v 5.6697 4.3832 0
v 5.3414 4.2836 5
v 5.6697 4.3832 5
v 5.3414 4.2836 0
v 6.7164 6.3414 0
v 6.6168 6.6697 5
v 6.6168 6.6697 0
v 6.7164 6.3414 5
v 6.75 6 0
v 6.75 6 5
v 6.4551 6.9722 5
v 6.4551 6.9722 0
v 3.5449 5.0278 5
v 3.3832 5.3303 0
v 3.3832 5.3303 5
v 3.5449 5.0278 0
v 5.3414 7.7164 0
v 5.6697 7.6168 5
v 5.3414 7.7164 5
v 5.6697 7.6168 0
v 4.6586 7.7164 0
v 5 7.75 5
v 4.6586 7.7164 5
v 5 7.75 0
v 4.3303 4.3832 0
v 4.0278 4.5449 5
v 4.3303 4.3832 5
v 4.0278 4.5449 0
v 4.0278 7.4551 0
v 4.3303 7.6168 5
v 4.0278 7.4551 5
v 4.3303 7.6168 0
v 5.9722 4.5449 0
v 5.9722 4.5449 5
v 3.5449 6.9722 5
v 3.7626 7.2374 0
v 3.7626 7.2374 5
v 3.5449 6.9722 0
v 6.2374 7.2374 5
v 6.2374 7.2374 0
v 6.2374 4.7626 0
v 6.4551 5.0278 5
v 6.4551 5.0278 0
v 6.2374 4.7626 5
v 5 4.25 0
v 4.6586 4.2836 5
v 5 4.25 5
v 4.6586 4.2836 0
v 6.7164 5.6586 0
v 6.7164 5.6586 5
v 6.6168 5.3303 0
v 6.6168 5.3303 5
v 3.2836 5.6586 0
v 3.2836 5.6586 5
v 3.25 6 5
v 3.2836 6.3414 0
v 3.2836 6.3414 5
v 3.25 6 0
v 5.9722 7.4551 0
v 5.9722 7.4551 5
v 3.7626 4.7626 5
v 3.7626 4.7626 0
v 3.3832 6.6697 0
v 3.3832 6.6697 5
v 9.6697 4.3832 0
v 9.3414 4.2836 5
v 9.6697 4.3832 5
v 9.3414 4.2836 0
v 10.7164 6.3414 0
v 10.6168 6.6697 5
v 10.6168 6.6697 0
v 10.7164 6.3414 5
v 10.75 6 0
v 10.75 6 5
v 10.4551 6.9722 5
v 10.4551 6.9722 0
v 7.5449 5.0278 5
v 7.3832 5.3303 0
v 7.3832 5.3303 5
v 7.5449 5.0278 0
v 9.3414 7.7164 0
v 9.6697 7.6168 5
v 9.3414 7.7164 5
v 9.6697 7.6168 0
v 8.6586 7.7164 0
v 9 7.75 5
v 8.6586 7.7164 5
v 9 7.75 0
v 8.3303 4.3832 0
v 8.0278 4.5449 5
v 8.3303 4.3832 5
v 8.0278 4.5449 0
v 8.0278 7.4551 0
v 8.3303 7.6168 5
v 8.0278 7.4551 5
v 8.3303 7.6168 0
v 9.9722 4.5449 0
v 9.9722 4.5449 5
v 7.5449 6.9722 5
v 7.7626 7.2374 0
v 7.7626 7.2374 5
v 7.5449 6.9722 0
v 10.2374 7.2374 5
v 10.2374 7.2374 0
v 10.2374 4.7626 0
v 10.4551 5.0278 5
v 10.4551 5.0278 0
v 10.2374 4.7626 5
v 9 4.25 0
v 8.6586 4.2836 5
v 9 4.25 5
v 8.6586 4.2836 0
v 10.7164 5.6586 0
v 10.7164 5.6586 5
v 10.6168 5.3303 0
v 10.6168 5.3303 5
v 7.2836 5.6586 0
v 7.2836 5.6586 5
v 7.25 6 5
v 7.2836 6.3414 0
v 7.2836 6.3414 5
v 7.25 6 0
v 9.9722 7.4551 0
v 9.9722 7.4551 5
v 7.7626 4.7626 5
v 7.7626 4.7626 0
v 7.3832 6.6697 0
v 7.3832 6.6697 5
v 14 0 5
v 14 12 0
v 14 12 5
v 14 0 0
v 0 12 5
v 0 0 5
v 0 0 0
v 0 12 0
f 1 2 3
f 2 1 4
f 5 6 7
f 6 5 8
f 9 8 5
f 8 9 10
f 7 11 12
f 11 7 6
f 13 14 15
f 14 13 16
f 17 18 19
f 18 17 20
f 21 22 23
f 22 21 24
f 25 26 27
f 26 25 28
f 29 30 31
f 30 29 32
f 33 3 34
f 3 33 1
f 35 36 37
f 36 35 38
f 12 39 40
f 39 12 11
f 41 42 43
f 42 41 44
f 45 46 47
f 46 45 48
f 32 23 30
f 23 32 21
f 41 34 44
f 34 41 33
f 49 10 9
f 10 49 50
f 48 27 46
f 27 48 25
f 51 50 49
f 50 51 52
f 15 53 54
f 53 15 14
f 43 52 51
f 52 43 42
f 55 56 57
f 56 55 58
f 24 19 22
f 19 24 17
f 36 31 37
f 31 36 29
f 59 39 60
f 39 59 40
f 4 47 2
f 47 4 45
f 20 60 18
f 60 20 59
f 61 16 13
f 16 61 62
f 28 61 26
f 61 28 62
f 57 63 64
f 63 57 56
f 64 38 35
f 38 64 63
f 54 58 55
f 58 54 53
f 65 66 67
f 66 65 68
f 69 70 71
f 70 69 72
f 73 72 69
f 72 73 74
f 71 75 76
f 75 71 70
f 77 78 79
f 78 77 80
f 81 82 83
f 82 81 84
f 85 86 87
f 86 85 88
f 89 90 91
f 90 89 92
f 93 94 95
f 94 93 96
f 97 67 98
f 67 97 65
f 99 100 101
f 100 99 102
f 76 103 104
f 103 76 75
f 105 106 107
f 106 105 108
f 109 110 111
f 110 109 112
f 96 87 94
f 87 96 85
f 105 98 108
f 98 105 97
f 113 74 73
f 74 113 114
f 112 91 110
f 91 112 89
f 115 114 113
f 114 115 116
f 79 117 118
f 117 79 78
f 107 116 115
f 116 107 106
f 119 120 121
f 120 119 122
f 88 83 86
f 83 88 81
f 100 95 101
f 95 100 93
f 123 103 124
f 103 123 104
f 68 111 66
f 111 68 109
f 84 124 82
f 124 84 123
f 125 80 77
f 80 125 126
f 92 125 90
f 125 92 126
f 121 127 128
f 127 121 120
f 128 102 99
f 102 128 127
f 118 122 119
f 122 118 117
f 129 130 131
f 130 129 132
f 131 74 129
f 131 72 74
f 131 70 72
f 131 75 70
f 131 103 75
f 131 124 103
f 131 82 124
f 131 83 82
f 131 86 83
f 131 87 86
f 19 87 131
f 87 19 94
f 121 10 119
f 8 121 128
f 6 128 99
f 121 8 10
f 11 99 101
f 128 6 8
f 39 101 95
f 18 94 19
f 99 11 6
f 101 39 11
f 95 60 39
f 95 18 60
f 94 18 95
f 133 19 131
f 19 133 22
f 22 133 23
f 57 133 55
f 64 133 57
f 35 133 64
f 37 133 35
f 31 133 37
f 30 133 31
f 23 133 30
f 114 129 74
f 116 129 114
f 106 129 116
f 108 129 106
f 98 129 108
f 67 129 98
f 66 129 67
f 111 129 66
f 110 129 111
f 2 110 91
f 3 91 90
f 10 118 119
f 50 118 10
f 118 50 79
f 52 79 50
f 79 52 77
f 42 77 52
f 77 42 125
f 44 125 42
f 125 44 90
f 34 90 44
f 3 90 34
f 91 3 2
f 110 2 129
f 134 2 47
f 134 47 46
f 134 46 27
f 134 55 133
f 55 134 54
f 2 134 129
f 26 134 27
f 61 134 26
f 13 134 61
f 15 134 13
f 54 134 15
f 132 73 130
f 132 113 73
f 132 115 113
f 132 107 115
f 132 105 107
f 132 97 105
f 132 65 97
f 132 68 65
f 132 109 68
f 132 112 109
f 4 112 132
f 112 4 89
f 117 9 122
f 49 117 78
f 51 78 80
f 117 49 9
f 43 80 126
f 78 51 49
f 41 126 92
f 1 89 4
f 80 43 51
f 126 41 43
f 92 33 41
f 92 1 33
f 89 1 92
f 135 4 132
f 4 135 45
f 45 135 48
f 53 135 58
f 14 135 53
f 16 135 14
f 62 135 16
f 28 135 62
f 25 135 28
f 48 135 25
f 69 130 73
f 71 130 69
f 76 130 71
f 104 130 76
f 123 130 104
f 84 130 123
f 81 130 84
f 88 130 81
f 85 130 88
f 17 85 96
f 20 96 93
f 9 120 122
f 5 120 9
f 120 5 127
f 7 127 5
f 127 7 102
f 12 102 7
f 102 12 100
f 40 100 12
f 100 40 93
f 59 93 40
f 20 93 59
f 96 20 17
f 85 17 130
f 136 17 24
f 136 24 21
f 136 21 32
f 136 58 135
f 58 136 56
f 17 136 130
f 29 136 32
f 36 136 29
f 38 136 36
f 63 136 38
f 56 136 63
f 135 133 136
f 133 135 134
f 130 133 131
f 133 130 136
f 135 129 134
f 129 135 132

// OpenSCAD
$fn = 32;

// ----------------------------------------------------------------------
// Micro pad: two-hole pad, 5-20 mm class
// ----------------------------------------------------------------------

// --- parameters (mm) ---
pad_l = 14;               // pad length, X
pad_w = 12;               // pad width, Y
pad_t = 5;                // pad thickness, Z
hole_d = 3.5;             // hole diameter
hole_x = 5;               // X of the first hole centre

difference() {
  cube([pad_l, pad_w, pad_t]);
  for (x = [hole_x, pad_l - hole_x])
    translate([x, pad_w / 2, -1])
      cylinder(h = pad_t + 2, d = hole_d);
}
